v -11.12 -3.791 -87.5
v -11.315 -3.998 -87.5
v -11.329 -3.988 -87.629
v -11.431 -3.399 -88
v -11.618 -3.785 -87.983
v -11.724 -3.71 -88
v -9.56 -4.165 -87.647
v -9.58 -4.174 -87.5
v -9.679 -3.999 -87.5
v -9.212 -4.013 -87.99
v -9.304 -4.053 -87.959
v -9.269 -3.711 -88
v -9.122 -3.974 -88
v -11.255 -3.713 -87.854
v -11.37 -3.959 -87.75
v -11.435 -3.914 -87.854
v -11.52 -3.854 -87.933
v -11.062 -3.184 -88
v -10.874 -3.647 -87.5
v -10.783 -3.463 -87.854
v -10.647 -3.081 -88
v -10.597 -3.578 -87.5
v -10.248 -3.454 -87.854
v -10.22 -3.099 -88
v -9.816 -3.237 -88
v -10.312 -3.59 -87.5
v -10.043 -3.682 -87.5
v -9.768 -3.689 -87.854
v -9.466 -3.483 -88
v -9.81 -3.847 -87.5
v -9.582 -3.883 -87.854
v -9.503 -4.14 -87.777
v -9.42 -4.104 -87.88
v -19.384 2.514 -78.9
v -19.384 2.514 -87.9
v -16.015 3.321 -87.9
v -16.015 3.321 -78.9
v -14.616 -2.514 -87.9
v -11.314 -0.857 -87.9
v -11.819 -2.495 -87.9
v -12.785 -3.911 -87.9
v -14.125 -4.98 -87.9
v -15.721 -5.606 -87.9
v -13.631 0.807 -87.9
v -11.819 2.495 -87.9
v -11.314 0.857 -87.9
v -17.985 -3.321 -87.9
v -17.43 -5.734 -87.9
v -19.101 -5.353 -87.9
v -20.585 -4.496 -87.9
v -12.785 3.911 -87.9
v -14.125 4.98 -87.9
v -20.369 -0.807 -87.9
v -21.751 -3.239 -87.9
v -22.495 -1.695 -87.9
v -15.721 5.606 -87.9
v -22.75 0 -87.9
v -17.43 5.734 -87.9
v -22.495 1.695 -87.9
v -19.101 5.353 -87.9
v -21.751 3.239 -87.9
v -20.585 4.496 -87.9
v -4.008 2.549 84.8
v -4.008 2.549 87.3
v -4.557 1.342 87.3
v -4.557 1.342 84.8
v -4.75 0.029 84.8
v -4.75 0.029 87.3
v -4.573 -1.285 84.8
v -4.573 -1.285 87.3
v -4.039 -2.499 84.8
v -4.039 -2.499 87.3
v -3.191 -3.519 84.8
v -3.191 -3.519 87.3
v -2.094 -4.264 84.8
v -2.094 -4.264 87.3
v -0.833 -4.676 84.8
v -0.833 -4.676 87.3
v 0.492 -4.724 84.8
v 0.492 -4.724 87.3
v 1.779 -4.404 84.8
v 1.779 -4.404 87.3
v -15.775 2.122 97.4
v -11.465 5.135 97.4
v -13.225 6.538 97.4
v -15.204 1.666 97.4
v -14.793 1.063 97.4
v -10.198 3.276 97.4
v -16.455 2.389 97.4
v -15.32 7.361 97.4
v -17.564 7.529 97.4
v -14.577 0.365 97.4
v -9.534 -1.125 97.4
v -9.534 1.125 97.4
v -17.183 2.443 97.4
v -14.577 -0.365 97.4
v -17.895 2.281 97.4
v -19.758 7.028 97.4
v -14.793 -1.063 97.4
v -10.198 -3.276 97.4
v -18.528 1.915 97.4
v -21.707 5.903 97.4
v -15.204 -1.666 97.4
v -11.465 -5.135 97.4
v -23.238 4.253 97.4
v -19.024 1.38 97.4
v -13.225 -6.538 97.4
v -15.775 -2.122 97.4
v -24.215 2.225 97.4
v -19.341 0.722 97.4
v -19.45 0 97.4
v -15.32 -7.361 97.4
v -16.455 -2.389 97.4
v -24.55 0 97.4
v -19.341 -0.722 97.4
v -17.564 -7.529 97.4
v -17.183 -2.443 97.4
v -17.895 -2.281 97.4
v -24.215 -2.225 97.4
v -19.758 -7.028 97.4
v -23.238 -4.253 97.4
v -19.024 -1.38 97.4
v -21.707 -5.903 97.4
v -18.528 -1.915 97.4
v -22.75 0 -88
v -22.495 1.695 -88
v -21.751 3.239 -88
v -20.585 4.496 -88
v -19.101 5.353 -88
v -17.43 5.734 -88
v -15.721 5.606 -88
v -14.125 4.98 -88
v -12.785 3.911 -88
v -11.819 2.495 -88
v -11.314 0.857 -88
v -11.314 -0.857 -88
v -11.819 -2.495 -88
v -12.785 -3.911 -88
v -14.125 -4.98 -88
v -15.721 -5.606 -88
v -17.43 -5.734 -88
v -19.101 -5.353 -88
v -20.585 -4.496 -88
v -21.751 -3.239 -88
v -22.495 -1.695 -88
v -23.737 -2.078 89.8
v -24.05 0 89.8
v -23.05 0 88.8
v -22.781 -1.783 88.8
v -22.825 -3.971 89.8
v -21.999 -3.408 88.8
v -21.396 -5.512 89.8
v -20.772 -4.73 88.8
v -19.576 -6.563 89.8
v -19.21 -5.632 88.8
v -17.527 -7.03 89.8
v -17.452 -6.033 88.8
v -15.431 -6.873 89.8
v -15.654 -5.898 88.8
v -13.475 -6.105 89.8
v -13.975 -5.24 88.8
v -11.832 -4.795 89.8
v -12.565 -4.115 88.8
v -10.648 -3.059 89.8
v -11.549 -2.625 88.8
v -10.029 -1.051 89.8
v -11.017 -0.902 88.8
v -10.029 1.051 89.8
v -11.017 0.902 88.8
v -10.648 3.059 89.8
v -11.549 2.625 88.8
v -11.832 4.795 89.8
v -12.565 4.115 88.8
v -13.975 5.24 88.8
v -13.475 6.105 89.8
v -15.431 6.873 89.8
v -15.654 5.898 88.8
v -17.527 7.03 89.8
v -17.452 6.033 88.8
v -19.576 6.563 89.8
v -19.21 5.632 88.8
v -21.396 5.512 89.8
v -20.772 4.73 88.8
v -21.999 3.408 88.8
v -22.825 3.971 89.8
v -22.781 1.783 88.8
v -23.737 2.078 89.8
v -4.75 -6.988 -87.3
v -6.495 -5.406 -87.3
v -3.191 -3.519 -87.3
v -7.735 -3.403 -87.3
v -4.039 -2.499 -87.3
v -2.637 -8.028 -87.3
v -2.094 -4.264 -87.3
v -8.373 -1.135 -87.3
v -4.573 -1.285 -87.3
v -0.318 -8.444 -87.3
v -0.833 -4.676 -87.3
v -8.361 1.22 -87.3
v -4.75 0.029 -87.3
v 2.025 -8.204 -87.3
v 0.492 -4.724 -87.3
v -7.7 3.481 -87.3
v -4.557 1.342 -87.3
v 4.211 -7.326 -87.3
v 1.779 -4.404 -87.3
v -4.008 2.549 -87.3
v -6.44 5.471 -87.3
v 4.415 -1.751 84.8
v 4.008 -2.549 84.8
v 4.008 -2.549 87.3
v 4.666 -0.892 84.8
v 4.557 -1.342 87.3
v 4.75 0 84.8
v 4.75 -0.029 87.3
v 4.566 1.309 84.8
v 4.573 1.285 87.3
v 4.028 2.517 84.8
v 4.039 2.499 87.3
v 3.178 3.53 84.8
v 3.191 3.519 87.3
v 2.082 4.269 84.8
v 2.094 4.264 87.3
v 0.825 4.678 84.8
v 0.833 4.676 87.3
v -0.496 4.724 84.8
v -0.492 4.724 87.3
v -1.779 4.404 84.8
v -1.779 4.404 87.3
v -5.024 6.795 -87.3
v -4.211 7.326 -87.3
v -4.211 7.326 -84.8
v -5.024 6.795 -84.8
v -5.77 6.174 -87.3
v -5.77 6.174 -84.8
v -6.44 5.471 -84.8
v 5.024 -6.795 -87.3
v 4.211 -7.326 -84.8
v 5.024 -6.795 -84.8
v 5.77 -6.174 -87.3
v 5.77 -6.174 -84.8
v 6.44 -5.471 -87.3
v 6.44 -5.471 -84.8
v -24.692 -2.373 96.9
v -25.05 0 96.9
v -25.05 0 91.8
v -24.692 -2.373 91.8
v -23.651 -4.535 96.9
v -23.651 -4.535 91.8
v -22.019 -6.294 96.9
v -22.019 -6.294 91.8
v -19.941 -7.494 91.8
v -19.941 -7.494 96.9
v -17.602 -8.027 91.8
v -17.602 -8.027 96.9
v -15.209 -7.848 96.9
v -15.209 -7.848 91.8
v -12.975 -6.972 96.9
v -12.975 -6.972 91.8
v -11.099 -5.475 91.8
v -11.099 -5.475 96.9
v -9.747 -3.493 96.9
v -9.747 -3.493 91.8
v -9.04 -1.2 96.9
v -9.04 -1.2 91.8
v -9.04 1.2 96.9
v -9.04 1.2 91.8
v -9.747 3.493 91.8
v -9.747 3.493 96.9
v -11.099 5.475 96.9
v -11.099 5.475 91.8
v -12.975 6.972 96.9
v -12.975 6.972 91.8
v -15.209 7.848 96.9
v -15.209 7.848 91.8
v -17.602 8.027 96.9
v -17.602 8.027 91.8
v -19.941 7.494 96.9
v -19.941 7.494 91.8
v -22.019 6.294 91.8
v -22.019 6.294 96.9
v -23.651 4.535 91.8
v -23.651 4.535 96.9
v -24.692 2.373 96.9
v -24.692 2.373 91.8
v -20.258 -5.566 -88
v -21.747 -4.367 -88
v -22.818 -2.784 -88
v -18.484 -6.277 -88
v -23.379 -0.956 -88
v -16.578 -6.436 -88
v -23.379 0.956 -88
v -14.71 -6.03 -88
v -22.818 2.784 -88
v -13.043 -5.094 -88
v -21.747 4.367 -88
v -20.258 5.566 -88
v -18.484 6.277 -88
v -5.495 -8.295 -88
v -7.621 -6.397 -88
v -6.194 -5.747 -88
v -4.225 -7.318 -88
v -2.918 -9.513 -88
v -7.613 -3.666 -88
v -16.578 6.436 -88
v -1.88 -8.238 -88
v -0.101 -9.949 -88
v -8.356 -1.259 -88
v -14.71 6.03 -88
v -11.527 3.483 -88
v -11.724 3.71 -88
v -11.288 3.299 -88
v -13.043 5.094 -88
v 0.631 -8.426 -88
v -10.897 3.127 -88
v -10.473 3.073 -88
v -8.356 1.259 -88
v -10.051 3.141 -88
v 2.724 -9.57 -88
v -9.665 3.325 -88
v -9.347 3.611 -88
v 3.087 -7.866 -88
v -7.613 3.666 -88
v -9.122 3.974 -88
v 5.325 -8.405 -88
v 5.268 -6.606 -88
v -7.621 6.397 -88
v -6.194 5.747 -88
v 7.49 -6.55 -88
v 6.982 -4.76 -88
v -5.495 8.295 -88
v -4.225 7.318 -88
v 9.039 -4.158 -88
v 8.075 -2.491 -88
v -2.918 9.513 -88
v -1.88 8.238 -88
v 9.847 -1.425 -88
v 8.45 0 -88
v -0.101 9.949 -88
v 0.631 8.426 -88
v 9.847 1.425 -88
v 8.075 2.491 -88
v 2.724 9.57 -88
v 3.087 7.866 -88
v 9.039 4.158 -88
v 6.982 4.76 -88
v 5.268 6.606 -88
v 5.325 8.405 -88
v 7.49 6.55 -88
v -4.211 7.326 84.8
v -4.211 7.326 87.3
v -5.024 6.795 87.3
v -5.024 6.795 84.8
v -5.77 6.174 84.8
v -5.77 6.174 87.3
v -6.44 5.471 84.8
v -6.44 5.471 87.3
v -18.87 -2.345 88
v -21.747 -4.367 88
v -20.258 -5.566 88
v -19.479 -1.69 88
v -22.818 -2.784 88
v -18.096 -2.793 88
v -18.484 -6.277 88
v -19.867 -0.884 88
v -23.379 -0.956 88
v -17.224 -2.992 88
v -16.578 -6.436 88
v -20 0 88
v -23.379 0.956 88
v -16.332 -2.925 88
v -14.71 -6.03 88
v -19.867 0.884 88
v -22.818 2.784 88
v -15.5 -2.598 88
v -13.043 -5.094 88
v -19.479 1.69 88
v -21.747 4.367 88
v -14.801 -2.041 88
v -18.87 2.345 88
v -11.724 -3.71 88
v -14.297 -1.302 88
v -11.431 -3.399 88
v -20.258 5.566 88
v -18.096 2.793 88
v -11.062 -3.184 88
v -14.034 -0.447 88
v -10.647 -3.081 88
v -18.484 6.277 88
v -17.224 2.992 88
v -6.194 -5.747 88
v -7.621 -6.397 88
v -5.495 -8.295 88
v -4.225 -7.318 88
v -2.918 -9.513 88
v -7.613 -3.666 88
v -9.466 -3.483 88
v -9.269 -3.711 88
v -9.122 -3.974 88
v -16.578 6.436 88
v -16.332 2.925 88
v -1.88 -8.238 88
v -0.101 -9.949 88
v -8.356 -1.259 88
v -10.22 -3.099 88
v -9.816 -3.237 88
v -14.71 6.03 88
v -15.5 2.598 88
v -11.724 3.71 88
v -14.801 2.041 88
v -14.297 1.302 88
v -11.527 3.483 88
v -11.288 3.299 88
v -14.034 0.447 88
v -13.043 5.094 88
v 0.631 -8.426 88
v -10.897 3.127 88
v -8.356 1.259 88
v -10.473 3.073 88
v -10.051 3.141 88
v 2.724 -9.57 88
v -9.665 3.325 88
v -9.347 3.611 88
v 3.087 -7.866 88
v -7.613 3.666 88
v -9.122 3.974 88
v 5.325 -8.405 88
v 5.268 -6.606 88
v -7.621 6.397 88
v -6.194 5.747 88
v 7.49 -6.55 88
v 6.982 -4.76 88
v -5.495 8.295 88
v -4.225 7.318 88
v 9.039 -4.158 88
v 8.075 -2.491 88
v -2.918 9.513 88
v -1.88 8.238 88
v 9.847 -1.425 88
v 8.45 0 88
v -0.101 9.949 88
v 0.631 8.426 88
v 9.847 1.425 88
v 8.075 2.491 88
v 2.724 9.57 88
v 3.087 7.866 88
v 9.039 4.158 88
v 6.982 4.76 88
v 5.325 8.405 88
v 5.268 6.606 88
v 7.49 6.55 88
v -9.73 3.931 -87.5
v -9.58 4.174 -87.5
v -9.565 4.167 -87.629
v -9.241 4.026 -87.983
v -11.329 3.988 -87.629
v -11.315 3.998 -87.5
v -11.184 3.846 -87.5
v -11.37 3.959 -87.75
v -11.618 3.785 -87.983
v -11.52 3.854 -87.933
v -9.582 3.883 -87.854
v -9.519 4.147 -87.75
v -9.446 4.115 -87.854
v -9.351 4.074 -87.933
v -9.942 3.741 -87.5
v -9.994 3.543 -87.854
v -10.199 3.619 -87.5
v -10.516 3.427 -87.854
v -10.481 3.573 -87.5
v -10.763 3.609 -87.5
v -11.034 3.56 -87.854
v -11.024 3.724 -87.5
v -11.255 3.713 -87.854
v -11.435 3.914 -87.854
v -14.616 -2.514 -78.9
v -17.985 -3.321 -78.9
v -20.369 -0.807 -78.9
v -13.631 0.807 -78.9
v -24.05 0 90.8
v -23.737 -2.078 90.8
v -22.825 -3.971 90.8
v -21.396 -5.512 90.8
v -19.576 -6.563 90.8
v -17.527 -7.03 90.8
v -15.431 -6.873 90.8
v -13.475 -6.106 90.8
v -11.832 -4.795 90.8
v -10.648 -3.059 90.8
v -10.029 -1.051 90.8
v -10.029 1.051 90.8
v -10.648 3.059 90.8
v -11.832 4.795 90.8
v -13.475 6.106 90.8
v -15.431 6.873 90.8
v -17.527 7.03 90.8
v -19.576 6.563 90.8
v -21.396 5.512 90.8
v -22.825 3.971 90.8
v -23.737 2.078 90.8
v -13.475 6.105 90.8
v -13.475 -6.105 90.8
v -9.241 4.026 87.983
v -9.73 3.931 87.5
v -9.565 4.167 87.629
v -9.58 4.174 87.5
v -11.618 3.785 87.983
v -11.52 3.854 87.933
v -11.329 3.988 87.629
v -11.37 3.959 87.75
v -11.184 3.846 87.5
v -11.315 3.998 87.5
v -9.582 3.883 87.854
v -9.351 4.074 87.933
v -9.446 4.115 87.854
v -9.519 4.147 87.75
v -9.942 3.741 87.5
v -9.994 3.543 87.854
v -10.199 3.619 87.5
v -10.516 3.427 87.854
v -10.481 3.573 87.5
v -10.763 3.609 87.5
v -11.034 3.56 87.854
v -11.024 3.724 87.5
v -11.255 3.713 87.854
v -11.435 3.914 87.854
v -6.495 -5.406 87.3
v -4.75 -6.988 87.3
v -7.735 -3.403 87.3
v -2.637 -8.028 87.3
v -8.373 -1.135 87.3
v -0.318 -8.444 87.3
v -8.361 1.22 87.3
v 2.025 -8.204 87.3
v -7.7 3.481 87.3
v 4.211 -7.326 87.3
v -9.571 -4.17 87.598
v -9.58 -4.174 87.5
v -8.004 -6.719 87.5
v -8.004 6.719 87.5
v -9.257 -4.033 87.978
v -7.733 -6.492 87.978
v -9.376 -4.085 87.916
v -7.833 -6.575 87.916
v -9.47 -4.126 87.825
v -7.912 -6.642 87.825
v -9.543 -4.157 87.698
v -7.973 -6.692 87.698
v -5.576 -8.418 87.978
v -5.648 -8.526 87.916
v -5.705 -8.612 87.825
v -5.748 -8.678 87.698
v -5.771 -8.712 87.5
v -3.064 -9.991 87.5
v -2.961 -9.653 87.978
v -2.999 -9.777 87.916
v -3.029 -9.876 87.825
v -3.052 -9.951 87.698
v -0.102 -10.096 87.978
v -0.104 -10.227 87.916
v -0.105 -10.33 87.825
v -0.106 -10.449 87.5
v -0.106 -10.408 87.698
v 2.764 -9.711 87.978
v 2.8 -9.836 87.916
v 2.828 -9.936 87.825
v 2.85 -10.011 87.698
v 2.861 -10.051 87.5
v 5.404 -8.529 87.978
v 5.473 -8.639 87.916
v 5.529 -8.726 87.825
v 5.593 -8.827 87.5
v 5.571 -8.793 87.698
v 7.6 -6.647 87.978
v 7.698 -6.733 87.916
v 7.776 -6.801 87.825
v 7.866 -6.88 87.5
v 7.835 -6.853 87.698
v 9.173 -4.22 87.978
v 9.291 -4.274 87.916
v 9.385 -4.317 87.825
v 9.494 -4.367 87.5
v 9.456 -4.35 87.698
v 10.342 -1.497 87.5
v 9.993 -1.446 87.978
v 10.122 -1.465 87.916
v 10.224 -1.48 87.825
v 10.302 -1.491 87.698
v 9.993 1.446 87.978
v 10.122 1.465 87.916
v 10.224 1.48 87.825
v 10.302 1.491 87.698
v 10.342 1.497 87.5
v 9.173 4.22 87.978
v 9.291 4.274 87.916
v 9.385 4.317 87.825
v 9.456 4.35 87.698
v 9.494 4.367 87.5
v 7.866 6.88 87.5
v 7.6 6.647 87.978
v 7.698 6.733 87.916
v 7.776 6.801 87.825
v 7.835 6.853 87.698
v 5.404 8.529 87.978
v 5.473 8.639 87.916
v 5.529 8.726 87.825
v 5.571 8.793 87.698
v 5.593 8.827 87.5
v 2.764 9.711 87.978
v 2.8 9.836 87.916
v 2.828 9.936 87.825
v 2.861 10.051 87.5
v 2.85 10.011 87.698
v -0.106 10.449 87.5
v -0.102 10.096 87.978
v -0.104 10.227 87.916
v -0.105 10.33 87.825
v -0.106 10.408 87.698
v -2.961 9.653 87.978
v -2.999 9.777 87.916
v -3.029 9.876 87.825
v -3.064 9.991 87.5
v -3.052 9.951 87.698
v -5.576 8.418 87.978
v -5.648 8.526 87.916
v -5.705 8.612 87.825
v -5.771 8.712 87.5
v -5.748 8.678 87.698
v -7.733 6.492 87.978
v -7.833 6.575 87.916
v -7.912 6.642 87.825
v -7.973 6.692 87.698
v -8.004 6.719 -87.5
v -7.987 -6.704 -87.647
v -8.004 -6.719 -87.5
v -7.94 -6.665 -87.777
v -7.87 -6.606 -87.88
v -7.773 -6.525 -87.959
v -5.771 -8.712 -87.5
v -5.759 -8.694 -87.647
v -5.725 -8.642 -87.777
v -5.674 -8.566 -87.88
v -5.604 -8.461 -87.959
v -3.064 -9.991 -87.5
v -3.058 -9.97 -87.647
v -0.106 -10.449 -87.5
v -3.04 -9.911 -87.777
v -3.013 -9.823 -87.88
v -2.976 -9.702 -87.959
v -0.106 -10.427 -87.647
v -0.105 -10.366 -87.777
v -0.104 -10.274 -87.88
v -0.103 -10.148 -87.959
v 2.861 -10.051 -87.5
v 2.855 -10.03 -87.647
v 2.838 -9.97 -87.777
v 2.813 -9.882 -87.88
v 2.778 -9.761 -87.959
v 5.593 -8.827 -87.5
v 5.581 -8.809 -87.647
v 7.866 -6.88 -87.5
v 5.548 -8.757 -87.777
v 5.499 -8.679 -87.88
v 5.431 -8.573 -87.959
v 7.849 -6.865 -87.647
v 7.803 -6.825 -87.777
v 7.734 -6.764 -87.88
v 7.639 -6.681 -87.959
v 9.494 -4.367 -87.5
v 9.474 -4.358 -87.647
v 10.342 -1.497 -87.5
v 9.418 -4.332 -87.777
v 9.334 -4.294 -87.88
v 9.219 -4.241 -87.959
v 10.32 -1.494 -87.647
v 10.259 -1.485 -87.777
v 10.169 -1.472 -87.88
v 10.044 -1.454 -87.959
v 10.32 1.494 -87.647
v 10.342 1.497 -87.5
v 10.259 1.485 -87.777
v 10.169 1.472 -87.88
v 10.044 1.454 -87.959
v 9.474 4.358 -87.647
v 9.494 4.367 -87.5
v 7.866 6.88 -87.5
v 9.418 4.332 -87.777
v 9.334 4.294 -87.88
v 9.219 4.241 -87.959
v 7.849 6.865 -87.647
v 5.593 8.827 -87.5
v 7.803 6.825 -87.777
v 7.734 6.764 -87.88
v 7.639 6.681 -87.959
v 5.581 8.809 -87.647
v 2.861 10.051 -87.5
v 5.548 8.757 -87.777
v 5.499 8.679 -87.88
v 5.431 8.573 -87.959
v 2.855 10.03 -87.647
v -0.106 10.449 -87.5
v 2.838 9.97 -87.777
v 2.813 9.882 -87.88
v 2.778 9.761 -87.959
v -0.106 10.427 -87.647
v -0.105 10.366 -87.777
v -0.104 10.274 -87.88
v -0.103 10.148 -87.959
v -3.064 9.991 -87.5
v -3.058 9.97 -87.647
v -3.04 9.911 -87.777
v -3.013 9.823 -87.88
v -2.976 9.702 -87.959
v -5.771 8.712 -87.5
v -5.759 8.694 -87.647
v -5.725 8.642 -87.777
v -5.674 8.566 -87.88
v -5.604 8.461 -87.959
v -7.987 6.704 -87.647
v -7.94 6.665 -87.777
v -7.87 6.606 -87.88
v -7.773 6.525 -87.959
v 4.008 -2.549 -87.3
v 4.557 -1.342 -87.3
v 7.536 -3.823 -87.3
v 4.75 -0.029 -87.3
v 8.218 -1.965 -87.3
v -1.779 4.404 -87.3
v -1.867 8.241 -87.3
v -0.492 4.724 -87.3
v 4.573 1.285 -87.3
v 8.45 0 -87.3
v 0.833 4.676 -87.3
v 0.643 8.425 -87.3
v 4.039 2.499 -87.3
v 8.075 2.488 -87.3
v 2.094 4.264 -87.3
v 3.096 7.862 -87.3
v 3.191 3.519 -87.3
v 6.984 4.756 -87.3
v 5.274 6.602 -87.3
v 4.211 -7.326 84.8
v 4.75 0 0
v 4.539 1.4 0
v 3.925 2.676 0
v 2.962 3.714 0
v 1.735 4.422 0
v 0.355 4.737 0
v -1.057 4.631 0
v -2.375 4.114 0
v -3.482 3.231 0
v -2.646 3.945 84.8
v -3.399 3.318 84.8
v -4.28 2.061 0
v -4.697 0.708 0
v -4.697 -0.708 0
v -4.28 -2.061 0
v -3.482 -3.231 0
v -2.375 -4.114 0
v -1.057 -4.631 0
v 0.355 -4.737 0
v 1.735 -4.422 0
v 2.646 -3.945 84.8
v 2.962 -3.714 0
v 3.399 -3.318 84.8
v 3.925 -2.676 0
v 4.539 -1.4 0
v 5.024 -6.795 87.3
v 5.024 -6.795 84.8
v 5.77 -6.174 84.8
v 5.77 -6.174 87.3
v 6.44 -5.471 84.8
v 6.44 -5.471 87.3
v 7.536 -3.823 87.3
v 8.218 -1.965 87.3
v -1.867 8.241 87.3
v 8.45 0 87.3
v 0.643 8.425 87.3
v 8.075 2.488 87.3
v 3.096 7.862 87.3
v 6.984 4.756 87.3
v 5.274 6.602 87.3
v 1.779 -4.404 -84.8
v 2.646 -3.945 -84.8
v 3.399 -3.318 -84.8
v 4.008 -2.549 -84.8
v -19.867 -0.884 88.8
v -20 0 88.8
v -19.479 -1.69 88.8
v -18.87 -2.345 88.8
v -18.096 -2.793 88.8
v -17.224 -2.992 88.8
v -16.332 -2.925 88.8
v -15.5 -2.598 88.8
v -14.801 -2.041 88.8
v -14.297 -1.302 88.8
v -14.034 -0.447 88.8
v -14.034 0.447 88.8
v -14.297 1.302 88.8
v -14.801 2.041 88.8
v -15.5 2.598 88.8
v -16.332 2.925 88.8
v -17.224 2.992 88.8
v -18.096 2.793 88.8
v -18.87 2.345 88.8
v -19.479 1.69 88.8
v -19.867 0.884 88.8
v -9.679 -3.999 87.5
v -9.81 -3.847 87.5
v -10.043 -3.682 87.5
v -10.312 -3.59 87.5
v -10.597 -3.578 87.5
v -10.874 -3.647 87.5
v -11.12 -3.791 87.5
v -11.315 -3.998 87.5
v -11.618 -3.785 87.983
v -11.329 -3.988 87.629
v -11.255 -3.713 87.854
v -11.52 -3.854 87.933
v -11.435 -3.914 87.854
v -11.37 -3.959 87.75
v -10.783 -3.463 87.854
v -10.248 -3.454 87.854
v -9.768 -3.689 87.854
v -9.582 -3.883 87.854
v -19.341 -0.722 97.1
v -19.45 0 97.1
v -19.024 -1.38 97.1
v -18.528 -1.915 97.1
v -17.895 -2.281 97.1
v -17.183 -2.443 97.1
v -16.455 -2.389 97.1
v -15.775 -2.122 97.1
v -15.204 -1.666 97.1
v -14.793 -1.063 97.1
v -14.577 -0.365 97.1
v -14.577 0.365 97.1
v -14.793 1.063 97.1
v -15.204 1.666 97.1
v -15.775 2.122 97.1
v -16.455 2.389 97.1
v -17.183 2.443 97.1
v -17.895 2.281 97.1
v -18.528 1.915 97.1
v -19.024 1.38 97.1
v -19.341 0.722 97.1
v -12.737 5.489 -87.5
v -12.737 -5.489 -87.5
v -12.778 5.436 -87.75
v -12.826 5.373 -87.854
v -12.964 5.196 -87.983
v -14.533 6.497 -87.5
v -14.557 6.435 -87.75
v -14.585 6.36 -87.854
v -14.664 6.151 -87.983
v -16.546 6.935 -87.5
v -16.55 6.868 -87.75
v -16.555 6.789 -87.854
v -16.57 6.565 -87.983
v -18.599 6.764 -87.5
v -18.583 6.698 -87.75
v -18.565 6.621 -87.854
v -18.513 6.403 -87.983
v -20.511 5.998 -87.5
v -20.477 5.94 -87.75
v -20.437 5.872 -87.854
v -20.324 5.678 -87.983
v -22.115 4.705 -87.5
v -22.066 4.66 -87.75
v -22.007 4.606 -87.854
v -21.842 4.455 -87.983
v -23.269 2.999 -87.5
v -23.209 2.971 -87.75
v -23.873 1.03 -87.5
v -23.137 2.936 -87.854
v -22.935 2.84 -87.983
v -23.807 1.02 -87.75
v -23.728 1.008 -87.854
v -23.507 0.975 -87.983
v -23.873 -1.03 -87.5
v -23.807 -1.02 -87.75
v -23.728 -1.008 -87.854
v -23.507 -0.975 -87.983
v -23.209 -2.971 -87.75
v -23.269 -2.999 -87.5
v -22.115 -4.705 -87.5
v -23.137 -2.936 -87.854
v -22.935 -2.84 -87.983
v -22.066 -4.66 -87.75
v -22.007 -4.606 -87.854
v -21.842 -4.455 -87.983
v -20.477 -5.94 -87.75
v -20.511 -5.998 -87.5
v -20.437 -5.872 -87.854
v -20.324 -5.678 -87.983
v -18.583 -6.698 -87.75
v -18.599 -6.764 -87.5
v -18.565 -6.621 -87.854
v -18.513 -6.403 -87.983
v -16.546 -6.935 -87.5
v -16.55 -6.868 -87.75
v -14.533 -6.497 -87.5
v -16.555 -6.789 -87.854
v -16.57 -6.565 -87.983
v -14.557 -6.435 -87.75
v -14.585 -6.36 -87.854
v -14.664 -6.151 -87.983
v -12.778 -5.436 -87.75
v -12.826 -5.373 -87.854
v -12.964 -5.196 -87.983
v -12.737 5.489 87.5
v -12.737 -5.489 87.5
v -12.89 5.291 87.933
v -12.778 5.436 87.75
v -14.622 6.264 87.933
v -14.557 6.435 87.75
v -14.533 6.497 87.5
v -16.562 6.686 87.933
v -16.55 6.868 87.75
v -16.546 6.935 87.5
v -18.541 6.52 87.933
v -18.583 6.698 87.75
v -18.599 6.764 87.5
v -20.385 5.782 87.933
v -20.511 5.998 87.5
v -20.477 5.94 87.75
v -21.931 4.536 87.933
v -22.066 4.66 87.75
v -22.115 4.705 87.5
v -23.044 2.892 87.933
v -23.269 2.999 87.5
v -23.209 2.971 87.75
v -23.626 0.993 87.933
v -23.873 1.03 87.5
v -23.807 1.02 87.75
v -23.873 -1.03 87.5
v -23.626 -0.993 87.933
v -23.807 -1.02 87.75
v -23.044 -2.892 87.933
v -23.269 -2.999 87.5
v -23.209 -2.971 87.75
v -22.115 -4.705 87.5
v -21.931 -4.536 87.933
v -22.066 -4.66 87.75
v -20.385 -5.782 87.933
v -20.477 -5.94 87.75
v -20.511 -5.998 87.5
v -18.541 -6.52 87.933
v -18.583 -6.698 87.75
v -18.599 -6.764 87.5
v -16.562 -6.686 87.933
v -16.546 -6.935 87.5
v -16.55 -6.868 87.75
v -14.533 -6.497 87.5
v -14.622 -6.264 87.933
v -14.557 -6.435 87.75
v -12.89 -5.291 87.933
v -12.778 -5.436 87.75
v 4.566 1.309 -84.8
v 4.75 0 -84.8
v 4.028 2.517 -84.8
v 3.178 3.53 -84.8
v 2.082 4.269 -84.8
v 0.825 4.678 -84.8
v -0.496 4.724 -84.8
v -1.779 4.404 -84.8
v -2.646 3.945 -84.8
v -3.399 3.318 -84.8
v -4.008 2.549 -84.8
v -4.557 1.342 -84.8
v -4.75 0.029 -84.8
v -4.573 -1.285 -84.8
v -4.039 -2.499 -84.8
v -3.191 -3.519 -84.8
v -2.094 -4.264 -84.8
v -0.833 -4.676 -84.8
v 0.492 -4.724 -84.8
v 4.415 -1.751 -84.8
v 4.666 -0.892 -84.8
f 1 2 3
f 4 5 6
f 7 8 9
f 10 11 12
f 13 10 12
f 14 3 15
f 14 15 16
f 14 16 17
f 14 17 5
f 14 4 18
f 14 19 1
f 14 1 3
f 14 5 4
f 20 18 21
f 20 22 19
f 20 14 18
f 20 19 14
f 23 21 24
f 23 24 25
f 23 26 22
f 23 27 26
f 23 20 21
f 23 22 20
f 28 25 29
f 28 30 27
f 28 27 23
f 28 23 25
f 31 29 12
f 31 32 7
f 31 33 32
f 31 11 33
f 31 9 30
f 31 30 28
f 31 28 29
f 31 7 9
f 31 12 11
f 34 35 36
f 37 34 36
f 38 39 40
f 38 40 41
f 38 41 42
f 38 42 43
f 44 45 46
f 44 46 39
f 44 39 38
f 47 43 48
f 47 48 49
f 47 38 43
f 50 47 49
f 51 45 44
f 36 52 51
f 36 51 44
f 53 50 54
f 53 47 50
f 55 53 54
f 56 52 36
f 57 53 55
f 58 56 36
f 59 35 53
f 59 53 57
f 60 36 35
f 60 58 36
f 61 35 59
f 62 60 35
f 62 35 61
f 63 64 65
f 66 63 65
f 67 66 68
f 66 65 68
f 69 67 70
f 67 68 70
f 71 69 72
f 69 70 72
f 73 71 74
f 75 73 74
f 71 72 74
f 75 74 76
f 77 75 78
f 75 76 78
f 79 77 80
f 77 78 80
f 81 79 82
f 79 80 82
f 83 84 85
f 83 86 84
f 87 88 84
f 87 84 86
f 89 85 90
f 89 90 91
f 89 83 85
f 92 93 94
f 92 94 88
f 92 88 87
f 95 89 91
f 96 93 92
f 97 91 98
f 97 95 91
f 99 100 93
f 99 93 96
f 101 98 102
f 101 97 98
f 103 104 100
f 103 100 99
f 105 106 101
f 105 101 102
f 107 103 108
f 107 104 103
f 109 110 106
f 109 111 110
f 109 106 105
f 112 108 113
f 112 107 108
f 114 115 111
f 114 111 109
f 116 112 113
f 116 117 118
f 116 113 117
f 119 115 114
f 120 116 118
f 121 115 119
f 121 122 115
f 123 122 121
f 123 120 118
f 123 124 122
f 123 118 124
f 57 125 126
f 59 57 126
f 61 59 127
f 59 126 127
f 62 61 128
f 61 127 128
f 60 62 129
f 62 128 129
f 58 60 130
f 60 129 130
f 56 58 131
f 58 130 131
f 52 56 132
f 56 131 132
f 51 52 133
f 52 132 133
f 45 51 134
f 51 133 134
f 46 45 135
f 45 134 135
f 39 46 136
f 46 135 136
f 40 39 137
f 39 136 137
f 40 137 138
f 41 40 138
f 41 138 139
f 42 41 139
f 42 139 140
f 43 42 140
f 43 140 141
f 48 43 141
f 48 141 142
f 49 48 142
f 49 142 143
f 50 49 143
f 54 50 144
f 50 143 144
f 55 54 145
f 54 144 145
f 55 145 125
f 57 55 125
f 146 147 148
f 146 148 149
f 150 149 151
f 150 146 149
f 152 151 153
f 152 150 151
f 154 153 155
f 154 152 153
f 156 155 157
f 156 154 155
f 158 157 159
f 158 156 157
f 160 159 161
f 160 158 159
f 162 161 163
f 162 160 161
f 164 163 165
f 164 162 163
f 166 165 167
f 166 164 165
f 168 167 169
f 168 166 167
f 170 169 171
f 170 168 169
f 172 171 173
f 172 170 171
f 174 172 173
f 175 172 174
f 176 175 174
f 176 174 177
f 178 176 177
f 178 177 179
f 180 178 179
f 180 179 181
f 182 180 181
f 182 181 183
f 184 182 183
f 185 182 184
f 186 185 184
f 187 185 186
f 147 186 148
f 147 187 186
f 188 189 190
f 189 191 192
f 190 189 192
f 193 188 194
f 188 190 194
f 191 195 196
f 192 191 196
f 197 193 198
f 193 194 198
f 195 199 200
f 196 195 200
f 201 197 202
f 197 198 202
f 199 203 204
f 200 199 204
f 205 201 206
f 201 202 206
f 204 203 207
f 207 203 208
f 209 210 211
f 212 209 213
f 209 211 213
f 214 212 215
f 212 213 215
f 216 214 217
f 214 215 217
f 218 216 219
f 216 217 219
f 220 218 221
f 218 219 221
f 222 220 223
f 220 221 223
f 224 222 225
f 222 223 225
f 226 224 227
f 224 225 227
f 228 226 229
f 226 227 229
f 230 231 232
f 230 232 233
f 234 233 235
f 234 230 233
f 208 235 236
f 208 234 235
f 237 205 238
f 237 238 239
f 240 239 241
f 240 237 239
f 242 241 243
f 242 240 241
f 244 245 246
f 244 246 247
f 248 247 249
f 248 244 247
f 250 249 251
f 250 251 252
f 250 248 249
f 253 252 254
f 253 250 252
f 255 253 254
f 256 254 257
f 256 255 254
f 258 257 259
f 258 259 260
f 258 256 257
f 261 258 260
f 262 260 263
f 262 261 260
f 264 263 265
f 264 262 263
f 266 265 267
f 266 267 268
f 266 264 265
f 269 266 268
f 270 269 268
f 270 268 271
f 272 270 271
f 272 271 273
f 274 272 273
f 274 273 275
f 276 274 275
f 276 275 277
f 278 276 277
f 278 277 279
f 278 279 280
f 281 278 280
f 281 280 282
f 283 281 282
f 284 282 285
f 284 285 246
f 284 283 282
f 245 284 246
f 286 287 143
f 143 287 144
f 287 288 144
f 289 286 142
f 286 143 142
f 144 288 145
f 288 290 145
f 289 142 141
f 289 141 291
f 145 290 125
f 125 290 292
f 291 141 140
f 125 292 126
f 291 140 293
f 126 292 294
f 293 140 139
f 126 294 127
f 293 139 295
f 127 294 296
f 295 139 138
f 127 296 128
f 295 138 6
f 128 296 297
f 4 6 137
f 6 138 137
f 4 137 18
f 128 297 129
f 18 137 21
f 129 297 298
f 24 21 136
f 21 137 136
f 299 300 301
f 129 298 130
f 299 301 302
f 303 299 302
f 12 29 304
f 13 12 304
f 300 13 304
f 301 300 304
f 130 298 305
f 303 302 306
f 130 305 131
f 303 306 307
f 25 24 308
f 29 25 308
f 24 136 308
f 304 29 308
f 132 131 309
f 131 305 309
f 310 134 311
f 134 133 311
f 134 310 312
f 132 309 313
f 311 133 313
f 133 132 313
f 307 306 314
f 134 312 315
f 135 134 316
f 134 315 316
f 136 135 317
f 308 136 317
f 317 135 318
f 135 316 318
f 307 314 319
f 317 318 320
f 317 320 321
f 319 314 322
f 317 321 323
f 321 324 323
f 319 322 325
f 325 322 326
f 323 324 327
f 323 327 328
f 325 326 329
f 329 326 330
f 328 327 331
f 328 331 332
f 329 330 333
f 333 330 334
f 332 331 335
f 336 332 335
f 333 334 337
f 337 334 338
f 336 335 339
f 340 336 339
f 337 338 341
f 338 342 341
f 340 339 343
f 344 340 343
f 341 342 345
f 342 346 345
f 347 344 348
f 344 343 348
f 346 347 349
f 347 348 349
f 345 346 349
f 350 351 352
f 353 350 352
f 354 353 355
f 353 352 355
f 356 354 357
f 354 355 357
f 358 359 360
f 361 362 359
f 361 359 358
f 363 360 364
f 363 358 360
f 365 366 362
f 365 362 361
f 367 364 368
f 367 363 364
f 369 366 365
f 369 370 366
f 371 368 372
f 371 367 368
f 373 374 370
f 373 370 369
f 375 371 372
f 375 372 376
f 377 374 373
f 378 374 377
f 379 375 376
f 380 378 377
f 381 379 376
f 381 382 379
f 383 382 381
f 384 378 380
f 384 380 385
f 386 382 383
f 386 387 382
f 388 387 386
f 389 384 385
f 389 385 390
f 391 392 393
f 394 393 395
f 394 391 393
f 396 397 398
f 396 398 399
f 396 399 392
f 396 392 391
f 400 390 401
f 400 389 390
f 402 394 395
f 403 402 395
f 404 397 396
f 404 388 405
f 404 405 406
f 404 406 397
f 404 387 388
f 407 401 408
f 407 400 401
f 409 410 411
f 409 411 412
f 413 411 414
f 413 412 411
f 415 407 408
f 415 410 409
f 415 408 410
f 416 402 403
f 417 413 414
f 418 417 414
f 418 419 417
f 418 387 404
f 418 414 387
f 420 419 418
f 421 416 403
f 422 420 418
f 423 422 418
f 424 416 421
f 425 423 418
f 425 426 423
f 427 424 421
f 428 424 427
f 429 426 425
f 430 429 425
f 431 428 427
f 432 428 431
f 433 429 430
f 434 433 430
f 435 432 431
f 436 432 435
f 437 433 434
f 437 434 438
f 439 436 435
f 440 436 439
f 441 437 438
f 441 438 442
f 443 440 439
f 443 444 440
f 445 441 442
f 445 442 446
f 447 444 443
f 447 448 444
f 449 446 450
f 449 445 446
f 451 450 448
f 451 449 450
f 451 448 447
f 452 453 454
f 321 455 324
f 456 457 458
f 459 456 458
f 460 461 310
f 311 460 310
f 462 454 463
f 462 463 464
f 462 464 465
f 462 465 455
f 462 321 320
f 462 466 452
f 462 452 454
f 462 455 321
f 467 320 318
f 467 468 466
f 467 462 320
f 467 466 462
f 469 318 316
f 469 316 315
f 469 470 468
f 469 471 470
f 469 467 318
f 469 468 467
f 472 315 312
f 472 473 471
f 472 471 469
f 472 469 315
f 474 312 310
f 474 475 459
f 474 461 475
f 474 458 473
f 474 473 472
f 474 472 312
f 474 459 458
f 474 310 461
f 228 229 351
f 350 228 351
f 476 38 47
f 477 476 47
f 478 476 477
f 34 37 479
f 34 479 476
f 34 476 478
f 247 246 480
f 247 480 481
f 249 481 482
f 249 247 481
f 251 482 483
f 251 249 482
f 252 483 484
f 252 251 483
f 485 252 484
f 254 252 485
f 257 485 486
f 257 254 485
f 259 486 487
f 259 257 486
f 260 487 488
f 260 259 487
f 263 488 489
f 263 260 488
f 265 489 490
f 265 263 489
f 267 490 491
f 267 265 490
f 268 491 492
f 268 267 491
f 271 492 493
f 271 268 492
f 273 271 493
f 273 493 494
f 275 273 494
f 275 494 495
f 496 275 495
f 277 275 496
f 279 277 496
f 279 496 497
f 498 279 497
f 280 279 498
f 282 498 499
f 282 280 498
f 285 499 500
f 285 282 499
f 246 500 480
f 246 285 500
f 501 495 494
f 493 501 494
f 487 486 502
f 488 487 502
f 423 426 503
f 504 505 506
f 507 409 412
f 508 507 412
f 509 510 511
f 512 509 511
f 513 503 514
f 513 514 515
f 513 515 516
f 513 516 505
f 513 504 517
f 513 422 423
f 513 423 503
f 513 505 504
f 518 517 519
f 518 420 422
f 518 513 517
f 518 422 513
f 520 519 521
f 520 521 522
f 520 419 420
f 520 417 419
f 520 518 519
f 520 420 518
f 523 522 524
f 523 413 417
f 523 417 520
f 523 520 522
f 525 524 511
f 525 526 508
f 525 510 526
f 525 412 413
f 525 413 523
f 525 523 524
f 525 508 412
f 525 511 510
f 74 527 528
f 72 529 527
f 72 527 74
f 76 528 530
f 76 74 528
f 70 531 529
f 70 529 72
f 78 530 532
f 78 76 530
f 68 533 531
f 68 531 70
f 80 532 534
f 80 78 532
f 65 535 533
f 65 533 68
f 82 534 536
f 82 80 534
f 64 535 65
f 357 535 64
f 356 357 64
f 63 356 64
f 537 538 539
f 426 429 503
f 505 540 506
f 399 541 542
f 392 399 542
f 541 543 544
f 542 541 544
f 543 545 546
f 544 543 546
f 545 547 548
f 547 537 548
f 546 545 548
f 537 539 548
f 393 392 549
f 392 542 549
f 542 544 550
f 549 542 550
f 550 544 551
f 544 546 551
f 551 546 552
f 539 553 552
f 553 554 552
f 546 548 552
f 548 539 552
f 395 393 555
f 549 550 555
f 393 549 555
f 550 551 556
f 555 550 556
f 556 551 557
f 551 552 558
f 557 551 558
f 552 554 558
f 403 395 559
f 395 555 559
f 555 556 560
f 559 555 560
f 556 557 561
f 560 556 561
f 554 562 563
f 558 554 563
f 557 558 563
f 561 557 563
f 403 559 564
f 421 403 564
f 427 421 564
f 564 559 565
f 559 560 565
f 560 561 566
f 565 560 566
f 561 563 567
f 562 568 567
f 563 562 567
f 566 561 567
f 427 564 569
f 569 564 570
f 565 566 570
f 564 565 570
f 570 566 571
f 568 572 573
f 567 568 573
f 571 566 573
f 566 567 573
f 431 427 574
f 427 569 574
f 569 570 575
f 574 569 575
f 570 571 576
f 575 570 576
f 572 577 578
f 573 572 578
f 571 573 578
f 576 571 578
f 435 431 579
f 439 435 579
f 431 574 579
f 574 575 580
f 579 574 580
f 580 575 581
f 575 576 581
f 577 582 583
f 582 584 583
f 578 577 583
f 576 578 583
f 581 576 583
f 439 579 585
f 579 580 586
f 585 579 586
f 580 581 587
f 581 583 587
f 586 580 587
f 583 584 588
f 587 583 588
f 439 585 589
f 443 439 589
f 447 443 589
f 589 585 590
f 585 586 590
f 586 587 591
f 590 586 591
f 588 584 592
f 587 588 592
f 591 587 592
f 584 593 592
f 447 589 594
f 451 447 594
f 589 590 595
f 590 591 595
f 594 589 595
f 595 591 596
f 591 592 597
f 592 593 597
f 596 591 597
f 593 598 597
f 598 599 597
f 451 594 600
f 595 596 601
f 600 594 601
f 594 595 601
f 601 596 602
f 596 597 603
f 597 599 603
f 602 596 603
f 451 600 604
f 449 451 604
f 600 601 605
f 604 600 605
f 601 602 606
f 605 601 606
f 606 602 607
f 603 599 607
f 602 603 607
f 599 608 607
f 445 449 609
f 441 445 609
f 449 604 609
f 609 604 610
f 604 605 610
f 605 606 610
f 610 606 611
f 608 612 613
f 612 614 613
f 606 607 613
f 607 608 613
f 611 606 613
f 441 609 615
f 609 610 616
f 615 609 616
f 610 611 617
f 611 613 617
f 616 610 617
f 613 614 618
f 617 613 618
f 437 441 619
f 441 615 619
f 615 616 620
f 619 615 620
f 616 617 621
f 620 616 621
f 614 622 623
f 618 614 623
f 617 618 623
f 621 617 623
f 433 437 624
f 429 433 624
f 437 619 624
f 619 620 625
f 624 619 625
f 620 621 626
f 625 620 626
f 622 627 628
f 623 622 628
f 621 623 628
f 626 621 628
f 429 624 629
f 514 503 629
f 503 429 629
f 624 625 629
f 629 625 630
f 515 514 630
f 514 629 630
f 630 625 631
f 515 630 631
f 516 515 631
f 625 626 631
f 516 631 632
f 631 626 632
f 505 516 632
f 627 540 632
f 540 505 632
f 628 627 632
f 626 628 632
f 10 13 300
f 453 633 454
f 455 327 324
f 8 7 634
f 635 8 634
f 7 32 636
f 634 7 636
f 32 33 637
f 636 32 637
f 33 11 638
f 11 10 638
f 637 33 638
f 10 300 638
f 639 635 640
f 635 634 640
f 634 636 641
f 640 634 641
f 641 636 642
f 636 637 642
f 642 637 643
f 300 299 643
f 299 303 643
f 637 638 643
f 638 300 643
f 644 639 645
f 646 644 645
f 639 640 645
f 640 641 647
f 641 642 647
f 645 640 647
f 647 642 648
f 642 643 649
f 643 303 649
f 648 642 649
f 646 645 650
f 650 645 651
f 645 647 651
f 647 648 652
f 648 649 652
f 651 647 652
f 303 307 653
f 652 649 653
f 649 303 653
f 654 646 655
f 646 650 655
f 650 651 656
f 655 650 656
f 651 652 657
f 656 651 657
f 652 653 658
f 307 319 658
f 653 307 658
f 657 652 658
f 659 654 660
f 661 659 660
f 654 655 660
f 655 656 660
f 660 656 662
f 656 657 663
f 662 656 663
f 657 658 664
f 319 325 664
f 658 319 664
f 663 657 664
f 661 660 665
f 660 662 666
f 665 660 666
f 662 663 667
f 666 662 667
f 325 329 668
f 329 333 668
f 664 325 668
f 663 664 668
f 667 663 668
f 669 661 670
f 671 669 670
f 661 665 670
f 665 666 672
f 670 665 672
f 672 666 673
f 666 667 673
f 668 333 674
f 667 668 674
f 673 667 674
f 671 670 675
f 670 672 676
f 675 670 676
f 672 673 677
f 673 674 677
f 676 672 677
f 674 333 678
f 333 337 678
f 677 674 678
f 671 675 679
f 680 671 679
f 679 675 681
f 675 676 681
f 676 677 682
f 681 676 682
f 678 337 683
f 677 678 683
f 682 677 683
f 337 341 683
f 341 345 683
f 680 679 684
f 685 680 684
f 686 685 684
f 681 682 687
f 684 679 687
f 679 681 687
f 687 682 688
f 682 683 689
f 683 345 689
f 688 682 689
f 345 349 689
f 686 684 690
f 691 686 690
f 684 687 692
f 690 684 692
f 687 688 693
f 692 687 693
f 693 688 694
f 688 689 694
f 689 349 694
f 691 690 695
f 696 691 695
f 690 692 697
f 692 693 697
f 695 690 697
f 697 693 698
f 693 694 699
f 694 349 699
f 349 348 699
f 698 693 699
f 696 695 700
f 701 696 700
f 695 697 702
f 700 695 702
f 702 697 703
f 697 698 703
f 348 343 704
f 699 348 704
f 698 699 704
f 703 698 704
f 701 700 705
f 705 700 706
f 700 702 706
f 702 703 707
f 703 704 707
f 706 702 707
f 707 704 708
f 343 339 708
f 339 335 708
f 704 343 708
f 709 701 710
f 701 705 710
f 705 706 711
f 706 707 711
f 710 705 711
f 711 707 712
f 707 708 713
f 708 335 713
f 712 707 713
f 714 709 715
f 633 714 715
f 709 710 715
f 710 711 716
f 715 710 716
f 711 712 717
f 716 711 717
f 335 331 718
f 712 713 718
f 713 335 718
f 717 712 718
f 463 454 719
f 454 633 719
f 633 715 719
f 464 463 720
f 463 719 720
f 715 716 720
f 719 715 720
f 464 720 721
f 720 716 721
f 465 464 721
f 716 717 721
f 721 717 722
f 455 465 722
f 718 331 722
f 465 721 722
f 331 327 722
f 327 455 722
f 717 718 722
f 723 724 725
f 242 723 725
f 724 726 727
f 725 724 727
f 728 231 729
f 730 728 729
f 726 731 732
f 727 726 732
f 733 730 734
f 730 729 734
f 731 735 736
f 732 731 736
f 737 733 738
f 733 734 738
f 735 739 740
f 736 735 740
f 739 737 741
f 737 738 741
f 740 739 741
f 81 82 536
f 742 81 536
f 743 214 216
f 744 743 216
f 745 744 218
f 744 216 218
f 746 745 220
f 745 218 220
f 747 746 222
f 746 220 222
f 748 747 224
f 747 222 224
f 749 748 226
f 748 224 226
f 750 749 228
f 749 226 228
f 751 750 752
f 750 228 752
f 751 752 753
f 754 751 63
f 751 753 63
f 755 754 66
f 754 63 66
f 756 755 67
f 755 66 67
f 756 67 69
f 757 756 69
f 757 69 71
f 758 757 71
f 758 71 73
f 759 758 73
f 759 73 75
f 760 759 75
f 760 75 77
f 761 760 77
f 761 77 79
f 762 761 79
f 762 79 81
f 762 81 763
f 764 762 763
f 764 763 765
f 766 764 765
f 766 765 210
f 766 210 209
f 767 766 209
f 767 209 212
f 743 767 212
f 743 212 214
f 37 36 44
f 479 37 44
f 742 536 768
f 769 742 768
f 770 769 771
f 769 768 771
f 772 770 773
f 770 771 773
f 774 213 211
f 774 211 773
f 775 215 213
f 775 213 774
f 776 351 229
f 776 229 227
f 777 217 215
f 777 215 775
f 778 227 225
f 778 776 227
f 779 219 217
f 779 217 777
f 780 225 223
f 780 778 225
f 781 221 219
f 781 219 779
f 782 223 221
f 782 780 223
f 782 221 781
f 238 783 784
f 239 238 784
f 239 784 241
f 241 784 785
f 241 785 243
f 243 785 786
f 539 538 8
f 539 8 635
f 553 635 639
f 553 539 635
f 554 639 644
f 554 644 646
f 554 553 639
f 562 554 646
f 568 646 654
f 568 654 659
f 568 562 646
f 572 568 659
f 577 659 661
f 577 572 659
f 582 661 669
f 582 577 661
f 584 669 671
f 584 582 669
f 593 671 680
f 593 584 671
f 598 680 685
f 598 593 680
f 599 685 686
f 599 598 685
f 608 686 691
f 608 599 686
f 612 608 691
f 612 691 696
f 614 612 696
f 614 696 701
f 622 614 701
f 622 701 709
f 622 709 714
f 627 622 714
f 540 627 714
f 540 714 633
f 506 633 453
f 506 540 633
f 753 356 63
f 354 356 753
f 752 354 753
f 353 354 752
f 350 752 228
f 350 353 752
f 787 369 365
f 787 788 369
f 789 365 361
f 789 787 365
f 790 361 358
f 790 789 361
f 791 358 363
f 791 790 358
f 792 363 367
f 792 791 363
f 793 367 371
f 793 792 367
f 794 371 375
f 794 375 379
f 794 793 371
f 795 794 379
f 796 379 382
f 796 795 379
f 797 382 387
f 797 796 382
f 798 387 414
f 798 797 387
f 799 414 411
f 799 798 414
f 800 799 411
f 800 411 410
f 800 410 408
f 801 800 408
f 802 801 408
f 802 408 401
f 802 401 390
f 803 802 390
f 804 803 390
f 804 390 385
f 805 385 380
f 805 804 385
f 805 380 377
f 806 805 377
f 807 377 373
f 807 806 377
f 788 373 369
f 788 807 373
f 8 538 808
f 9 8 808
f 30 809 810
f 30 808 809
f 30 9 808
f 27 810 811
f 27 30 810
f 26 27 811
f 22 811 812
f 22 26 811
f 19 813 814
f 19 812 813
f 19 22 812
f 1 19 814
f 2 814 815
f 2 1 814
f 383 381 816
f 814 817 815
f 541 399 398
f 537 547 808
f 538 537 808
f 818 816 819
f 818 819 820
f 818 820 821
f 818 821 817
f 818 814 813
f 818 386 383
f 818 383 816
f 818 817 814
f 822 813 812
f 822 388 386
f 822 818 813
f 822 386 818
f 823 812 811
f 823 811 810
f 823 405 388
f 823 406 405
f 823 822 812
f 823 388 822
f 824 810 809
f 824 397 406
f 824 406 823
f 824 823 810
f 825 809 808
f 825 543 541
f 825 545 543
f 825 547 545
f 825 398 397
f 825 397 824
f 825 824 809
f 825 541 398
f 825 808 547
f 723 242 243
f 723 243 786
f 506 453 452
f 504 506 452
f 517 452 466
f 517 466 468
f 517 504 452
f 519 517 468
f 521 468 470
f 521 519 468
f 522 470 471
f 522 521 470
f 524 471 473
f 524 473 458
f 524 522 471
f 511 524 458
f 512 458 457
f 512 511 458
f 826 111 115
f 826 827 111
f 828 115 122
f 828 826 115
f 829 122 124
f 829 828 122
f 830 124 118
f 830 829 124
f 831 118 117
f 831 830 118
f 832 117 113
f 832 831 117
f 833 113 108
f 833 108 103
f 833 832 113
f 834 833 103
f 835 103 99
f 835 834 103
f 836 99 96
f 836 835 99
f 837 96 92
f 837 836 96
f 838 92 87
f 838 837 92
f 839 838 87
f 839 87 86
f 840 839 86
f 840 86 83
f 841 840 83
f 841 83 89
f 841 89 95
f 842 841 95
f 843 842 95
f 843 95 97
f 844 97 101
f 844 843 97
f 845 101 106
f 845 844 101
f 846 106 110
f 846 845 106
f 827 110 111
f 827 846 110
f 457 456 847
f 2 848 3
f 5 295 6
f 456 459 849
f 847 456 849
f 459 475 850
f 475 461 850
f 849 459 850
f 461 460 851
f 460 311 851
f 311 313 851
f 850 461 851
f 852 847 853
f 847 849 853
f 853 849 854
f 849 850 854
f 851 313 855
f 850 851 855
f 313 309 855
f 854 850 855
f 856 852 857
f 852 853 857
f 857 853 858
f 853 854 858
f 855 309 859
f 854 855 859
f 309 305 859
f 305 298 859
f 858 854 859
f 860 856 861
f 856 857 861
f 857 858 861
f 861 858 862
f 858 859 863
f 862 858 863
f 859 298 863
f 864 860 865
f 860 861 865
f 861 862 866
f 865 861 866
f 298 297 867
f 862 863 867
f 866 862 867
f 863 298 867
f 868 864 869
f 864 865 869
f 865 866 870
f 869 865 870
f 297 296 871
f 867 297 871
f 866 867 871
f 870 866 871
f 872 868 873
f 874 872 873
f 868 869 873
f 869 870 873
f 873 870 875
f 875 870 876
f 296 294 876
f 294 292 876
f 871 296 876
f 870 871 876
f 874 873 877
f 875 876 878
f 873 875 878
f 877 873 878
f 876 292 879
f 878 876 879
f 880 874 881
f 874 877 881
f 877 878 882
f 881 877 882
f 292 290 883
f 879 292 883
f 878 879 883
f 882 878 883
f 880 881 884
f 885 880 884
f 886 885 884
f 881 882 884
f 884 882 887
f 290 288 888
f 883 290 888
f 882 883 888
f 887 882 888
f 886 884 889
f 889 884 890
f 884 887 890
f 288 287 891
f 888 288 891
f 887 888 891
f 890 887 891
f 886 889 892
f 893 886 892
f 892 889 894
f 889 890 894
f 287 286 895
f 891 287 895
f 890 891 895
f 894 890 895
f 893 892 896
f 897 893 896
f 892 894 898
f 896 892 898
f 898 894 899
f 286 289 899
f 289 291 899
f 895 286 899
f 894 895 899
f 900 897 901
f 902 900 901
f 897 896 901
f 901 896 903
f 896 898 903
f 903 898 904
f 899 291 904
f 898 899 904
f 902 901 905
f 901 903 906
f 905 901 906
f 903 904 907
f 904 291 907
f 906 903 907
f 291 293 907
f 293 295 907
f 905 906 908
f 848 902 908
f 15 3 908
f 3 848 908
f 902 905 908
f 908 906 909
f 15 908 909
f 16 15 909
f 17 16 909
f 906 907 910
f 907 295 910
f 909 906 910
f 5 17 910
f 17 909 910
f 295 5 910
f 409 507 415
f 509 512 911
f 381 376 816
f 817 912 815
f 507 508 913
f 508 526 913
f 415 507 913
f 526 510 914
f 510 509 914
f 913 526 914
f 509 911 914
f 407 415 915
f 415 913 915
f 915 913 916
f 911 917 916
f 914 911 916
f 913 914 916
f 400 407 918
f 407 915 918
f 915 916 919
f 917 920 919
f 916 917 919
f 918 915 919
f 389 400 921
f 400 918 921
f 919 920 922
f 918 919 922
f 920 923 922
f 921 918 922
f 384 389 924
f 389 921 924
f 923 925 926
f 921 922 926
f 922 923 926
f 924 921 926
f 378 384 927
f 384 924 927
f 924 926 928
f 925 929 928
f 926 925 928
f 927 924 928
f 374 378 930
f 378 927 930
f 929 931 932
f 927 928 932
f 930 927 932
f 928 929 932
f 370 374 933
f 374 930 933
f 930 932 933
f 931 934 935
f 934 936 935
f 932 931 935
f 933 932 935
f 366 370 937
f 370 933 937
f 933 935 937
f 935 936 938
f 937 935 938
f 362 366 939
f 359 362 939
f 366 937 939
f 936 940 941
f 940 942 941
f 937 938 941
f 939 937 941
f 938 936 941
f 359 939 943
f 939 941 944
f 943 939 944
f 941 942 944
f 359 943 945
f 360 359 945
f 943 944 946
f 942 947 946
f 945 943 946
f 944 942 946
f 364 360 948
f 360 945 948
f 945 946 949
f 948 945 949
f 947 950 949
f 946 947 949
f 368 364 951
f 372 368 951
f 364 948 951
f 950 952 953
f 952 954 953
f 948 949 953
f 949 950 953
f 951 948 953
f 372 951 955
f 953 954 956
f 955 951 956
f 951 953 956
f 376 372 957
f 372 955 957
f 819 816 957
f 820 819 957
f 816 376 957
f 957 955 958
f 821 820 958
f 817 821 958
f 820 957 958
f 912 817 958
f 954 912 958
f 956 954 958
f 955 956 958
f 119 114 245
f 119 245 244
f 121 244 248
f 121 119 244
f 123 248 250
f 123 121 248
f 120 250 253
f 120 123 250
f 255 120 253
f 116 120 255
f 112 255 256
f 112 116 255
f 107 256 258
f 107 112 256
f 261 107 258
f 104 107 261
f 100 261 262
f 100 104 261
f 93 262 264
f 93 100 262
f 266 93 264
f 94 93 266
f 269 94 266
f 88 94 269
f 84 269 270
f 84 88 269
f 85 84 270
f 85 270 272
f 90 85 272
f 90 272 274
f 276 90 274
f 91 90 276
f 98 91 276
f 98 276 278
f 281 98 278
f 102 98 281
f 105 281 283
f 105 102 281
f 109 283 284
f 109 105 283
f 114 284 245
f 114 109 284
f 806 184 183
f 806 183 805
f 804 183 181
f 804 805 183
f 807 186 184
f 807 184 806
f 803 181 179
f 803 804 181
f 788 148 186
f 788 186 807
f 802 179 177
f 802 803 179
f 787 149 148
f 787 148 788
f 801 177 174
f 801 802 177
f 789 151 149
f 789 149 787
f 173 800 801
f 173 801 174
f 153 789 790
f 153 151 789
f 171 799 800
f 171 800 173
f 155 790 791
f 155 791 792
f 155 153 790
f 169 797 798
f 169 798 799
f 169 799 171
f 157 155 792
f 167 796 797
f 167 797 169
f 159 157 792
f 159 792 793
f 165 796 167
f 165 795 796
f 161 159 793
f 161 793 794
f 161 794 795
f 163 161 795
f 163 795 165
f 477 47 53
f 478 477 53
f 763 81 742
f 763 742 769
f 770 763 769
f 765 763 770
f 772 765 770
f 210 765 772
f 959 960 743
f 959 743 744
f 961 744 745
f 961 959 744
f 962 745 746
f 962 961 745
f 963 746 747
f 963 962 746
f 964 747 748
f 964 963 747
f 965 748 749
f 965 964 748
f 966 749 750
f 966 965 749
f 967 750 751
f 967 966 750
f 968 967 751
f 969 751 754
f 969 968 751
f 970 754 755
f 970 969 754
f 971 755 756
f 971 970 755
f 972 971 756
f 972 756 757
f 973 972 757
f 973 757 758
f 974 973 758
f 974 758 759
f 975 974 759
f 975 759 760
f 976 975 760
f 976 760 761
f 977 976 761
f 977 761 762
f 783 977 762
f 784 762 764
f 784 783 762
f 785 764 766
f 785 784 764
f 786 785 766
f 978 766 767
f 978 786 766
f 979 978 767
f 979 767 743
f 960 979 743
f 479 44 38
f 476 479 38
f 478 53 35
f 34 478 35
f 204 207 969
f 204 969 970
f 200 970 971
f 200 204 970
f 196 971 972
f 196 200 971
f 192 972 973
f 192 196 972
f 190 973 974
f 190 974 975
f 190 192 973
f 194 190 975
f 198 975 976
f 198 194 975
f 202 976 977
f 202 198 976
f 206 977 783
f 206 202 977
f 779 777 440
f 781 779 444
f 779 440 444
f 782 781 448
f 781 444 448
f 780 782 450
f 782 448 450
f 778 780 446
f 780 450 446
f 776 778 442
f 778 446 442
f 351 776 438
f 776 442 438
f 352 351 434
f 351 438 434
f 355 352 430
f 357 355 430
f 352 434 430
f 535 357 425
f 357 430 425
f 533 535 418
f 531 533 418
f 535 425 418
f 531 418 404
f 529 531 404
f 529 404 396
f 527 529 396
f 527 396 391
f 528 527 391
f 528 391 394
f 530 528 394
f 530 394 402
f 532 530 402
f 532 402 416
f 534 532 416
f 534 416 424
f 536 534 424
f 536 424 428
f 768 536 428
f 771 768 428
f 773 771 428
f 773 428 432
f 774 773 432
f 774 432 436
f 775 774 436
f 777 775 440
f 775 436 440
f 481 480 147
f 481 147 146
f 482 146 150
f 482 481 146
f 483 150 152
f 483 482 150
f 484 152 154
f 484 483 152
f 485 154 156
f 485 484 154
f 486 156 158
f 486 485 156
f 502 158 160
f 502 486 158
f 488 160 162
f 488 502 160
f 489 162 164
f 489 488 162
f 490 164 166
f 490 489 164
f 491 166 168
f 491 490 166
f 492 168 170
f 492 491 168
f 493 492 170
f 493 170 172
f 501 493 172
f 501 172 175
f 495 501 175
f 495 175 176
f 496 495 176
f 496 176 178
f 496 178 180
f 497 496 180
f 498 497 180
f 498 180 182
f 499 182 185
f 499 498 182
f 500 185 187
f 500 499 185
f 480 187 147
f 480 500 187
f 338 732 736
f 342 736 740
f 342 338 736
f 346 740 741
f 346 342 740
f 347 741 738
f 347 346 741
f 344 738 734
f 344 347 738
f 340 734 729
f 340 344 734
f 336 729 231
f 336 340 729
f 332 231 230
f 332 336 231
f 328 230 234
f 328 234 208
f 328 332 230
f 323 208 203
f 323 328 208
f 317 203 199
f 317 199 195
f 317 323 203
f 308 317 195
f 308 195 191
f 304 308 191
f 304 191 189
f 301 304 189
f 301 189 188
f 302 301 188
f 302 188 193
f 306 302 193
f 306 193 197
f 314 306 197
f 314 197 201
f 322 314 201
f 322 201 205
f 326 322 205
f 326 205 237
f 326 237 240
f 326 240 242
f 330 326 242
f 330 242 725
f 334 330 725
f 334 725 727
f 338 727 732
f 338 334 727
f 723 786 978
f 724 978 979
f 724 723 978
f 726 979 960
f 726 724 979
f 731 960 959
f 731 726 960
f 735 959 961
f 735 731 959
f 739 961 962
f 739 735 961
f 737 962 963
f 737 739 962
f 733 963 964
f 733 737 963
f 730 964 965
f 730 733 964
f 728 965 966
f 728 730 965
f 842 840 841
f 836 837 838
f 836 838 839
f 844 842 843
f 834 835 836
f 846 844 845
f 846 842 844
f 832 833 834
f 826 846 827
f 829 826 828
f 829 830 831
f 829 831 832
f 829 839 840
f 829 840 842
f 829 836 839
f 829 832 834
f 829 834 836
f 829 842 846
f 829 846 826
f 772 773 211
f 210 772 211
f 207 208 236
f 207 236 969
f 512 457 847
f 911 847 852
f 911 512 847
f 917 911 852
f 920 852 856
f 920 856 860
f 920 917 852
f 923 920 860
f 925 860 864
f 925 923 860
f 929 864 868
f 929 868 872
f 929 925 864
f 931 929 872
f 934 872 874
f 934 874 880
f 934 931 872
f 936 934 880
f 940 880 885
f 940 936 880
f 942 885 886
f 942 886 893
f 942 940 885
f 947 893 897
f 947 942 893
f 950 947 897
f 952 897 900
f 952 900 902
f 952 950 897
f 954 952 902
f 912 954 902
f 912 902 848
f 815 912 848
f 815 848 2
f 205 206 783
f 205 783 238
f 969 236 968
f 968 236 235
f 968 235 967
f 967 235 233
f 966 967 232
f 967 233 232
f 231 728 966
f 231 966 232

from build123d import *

# Parameters (mm, degrees)
EXTRUDE1_DEPTH = 88
FILLET1_R      = 1
SKETCH4_R      = 8.45
EXTRUDE2_DEPTH = 0.7
EXTRUDE3_DEPTH = 2.5
SKETCH6_R      = 4.75
EXTRUDE4_DEPTH = 84.8
CHAMFER1_SIZE  = 1
CHAMFER2_SIZE  = 0.5
SKETCH7_R      = 5.75
EXTRUDE5_DEPTH = 0.1
EXTRUDE6_DEPTH = 9
FILLET2_R      = 0.5


with BuildPart() as part:
    # Sketch2 → Extrude1 (new, symmetric)
    with BuildSketch(Plane.XY):
        with BuildLine():
            ThreePointArc((-10.291176471, -1.814989491), (10.45, 0), (-10.291176471, 1.814989491))
            ThreePointArc((-10.291176471, 1.814989491), (-23.95, 0), (-10.291176471, -1.814989491))
        make_face()
    extrude(amount=EXTRUDE1_DEPTH, both=True)

    # Fillet1
    fillet1_edges = [part.edges().sort_by_distance(p)[0] for p in [
        (-10.291176471, 1.814989491, 0),
        (-10.291176471, -1.814989491, 0),
    ]]
    fillet(fillet1_edges, radius=FILLET1_R)

    # Sketch3 → Revolve1 (revolve)
    with BuildSketch(Plane(origin=(0, 0, 0), x_dir=(1, 0, 0), z_dir=(0, 1, 0))):
        Polygon((-20, -88), (-20, -88.8), (-24.05, -88.8), (-24.05, -90.8), (-25.05, -90.8), (-25.05, -97.4), (-19.45, -97.4), (-19.45, -97.1), (-17, -97.1), (-17, -88), align=None)
    revolve(axis=Axis((-17, 0, -88.93192935), (0, 0, 1)))

    # Sketch4 → Extrude2 (cut)
    with BuildSketch(Plane.XY.offset(88)):
        Circle(SKETCH4_R)
    extrude2 = extrude(amount=-EXTRUDE2_DEPTH, mode=Mode.SUBTRACT)

    # Sketch5 → Extrude3 (cut)
    with BuildSketch(Plane.XY.offset(87.3)):
        with BuildLine():
            Line((-6.439880123, 5.470872325), (-4.008084609, 2.549069981))
            ThreePointArc((-4.008084609, 2.549069981), (-3.650918419, -3.038633689), (1.779102837, -4.404235813))
            Line((1.779102837, -4.404235813), (4.210898352, -7.326038157))
            ThreePointArc((4.210898352, -7.326038157), (5.405569405, -6.494791714), (6.439880123, -5.470872325))
            Line((6.439880123, -5.470872325), (4.008084609, -2.549069981))
            ThreePointArc((4.008084609, -2.549069981), (3.650918419, 3.038633689), (-1.779102837, 4.404235813))
            Line((-1.779102837, 4.404235813), (-4.210898352, 7.326038157))
            ThreePointArc((-4.210898352, 7.326038157), (-5.405569405, 6.494791714), (-6.439880123, 5.470872325))
        make_face()
    extrude3 = extrude(amount=-EXTRUDE3_DEPTH, mode=Mode.SUBTRACT)

    # Sketch6 → Extrude4 (cut)
    with BuildSketch(Plane.XY.offset(84.8)):
        Circle(SKETCH6_R)
    extrude4 = extrude(amount=-EXTRUDE4_DEPTH, mode=Mode.SUBTRACT)

    # Mirror1: Extrude2, Extrude3, Extrude4 across plane
    add(extrude2.mirror(Plane.XY), mode=Mode.SUBTRACT)
    add(extrude3.mirror(Plane.XY), mode=Mode.SUBTRACT)
    add(extrude4.mirror(Plane.XY), mode=Mode.SUBTRACT)

    # Chamfer1
    chamfer1_edges = [part.edges().sort_by_distance(p)[0] for p in [
        (-9.95, 0, 88.8),
        (-8.95, 0, 90.8),
    ]]
    chamfer(chamfer1_edges, length=CHAMFER1_SIZE - 0.0001)  # a hair under: the kernel refuses the full size

    # Chamfer2
    chamfer2_edges = [part.edges().sort_by_distance(p)[0] for p in [
        (-8.95, 0, 97.4),
    ]]
    chamfer(chamfer2_edges, length=CHAMFER2_SIZE)

    # Sketch7 → Extrude5 (cut)
    with BuildSketch(Plane(origin=(0, 0, -88), x_dir=(-1, 0, 0), z_dir=(0, 0, -1))):
        with Locations((17, 0)):
            Circle(SKETCH7_R)
    extrude(amount=-EXTRUDE5_DEPTH, mode=Mode.SUBTRACT)

    # Sketch8 → Extrude6 (cut)
    with BuildSketch(Plane(origin=(0, 0, -87.9), x_dir=(-1, 0, 0), z_dir=(0, 0, -1))):
        Polygon((19.383629921, 2.513624554), (16.014952241, 3.321096342), (13.63132232, 0.807471788), (14.616370079, -2.513624554), (17.985047759, -3.321096342), (20.36867768, -0.807471788), align=None)
    extrude(amount=-EXTRUDE6_DEPTH, mode=Mode.SUBTRACT)

    # Fillet2
    fillet2_edges = [part.edges().sort_by_distance(p)[0] for p in [
        (-23.95, 0, -88),
        (-23.95, 0, 88),
        (-10.396212718, -3.578308658, -88),
        (-10.396212718, -3.578308658, 88),
        (-10.396212718, 3.578308658, -88),
        (-10.396212718, 3.578308658, 88),
        (10.45, 0, -88),
        (10.45, 0, 88),
    ]]
    fillet(fillet2_edges, radius=FILLET2_R)


solid = part.part
